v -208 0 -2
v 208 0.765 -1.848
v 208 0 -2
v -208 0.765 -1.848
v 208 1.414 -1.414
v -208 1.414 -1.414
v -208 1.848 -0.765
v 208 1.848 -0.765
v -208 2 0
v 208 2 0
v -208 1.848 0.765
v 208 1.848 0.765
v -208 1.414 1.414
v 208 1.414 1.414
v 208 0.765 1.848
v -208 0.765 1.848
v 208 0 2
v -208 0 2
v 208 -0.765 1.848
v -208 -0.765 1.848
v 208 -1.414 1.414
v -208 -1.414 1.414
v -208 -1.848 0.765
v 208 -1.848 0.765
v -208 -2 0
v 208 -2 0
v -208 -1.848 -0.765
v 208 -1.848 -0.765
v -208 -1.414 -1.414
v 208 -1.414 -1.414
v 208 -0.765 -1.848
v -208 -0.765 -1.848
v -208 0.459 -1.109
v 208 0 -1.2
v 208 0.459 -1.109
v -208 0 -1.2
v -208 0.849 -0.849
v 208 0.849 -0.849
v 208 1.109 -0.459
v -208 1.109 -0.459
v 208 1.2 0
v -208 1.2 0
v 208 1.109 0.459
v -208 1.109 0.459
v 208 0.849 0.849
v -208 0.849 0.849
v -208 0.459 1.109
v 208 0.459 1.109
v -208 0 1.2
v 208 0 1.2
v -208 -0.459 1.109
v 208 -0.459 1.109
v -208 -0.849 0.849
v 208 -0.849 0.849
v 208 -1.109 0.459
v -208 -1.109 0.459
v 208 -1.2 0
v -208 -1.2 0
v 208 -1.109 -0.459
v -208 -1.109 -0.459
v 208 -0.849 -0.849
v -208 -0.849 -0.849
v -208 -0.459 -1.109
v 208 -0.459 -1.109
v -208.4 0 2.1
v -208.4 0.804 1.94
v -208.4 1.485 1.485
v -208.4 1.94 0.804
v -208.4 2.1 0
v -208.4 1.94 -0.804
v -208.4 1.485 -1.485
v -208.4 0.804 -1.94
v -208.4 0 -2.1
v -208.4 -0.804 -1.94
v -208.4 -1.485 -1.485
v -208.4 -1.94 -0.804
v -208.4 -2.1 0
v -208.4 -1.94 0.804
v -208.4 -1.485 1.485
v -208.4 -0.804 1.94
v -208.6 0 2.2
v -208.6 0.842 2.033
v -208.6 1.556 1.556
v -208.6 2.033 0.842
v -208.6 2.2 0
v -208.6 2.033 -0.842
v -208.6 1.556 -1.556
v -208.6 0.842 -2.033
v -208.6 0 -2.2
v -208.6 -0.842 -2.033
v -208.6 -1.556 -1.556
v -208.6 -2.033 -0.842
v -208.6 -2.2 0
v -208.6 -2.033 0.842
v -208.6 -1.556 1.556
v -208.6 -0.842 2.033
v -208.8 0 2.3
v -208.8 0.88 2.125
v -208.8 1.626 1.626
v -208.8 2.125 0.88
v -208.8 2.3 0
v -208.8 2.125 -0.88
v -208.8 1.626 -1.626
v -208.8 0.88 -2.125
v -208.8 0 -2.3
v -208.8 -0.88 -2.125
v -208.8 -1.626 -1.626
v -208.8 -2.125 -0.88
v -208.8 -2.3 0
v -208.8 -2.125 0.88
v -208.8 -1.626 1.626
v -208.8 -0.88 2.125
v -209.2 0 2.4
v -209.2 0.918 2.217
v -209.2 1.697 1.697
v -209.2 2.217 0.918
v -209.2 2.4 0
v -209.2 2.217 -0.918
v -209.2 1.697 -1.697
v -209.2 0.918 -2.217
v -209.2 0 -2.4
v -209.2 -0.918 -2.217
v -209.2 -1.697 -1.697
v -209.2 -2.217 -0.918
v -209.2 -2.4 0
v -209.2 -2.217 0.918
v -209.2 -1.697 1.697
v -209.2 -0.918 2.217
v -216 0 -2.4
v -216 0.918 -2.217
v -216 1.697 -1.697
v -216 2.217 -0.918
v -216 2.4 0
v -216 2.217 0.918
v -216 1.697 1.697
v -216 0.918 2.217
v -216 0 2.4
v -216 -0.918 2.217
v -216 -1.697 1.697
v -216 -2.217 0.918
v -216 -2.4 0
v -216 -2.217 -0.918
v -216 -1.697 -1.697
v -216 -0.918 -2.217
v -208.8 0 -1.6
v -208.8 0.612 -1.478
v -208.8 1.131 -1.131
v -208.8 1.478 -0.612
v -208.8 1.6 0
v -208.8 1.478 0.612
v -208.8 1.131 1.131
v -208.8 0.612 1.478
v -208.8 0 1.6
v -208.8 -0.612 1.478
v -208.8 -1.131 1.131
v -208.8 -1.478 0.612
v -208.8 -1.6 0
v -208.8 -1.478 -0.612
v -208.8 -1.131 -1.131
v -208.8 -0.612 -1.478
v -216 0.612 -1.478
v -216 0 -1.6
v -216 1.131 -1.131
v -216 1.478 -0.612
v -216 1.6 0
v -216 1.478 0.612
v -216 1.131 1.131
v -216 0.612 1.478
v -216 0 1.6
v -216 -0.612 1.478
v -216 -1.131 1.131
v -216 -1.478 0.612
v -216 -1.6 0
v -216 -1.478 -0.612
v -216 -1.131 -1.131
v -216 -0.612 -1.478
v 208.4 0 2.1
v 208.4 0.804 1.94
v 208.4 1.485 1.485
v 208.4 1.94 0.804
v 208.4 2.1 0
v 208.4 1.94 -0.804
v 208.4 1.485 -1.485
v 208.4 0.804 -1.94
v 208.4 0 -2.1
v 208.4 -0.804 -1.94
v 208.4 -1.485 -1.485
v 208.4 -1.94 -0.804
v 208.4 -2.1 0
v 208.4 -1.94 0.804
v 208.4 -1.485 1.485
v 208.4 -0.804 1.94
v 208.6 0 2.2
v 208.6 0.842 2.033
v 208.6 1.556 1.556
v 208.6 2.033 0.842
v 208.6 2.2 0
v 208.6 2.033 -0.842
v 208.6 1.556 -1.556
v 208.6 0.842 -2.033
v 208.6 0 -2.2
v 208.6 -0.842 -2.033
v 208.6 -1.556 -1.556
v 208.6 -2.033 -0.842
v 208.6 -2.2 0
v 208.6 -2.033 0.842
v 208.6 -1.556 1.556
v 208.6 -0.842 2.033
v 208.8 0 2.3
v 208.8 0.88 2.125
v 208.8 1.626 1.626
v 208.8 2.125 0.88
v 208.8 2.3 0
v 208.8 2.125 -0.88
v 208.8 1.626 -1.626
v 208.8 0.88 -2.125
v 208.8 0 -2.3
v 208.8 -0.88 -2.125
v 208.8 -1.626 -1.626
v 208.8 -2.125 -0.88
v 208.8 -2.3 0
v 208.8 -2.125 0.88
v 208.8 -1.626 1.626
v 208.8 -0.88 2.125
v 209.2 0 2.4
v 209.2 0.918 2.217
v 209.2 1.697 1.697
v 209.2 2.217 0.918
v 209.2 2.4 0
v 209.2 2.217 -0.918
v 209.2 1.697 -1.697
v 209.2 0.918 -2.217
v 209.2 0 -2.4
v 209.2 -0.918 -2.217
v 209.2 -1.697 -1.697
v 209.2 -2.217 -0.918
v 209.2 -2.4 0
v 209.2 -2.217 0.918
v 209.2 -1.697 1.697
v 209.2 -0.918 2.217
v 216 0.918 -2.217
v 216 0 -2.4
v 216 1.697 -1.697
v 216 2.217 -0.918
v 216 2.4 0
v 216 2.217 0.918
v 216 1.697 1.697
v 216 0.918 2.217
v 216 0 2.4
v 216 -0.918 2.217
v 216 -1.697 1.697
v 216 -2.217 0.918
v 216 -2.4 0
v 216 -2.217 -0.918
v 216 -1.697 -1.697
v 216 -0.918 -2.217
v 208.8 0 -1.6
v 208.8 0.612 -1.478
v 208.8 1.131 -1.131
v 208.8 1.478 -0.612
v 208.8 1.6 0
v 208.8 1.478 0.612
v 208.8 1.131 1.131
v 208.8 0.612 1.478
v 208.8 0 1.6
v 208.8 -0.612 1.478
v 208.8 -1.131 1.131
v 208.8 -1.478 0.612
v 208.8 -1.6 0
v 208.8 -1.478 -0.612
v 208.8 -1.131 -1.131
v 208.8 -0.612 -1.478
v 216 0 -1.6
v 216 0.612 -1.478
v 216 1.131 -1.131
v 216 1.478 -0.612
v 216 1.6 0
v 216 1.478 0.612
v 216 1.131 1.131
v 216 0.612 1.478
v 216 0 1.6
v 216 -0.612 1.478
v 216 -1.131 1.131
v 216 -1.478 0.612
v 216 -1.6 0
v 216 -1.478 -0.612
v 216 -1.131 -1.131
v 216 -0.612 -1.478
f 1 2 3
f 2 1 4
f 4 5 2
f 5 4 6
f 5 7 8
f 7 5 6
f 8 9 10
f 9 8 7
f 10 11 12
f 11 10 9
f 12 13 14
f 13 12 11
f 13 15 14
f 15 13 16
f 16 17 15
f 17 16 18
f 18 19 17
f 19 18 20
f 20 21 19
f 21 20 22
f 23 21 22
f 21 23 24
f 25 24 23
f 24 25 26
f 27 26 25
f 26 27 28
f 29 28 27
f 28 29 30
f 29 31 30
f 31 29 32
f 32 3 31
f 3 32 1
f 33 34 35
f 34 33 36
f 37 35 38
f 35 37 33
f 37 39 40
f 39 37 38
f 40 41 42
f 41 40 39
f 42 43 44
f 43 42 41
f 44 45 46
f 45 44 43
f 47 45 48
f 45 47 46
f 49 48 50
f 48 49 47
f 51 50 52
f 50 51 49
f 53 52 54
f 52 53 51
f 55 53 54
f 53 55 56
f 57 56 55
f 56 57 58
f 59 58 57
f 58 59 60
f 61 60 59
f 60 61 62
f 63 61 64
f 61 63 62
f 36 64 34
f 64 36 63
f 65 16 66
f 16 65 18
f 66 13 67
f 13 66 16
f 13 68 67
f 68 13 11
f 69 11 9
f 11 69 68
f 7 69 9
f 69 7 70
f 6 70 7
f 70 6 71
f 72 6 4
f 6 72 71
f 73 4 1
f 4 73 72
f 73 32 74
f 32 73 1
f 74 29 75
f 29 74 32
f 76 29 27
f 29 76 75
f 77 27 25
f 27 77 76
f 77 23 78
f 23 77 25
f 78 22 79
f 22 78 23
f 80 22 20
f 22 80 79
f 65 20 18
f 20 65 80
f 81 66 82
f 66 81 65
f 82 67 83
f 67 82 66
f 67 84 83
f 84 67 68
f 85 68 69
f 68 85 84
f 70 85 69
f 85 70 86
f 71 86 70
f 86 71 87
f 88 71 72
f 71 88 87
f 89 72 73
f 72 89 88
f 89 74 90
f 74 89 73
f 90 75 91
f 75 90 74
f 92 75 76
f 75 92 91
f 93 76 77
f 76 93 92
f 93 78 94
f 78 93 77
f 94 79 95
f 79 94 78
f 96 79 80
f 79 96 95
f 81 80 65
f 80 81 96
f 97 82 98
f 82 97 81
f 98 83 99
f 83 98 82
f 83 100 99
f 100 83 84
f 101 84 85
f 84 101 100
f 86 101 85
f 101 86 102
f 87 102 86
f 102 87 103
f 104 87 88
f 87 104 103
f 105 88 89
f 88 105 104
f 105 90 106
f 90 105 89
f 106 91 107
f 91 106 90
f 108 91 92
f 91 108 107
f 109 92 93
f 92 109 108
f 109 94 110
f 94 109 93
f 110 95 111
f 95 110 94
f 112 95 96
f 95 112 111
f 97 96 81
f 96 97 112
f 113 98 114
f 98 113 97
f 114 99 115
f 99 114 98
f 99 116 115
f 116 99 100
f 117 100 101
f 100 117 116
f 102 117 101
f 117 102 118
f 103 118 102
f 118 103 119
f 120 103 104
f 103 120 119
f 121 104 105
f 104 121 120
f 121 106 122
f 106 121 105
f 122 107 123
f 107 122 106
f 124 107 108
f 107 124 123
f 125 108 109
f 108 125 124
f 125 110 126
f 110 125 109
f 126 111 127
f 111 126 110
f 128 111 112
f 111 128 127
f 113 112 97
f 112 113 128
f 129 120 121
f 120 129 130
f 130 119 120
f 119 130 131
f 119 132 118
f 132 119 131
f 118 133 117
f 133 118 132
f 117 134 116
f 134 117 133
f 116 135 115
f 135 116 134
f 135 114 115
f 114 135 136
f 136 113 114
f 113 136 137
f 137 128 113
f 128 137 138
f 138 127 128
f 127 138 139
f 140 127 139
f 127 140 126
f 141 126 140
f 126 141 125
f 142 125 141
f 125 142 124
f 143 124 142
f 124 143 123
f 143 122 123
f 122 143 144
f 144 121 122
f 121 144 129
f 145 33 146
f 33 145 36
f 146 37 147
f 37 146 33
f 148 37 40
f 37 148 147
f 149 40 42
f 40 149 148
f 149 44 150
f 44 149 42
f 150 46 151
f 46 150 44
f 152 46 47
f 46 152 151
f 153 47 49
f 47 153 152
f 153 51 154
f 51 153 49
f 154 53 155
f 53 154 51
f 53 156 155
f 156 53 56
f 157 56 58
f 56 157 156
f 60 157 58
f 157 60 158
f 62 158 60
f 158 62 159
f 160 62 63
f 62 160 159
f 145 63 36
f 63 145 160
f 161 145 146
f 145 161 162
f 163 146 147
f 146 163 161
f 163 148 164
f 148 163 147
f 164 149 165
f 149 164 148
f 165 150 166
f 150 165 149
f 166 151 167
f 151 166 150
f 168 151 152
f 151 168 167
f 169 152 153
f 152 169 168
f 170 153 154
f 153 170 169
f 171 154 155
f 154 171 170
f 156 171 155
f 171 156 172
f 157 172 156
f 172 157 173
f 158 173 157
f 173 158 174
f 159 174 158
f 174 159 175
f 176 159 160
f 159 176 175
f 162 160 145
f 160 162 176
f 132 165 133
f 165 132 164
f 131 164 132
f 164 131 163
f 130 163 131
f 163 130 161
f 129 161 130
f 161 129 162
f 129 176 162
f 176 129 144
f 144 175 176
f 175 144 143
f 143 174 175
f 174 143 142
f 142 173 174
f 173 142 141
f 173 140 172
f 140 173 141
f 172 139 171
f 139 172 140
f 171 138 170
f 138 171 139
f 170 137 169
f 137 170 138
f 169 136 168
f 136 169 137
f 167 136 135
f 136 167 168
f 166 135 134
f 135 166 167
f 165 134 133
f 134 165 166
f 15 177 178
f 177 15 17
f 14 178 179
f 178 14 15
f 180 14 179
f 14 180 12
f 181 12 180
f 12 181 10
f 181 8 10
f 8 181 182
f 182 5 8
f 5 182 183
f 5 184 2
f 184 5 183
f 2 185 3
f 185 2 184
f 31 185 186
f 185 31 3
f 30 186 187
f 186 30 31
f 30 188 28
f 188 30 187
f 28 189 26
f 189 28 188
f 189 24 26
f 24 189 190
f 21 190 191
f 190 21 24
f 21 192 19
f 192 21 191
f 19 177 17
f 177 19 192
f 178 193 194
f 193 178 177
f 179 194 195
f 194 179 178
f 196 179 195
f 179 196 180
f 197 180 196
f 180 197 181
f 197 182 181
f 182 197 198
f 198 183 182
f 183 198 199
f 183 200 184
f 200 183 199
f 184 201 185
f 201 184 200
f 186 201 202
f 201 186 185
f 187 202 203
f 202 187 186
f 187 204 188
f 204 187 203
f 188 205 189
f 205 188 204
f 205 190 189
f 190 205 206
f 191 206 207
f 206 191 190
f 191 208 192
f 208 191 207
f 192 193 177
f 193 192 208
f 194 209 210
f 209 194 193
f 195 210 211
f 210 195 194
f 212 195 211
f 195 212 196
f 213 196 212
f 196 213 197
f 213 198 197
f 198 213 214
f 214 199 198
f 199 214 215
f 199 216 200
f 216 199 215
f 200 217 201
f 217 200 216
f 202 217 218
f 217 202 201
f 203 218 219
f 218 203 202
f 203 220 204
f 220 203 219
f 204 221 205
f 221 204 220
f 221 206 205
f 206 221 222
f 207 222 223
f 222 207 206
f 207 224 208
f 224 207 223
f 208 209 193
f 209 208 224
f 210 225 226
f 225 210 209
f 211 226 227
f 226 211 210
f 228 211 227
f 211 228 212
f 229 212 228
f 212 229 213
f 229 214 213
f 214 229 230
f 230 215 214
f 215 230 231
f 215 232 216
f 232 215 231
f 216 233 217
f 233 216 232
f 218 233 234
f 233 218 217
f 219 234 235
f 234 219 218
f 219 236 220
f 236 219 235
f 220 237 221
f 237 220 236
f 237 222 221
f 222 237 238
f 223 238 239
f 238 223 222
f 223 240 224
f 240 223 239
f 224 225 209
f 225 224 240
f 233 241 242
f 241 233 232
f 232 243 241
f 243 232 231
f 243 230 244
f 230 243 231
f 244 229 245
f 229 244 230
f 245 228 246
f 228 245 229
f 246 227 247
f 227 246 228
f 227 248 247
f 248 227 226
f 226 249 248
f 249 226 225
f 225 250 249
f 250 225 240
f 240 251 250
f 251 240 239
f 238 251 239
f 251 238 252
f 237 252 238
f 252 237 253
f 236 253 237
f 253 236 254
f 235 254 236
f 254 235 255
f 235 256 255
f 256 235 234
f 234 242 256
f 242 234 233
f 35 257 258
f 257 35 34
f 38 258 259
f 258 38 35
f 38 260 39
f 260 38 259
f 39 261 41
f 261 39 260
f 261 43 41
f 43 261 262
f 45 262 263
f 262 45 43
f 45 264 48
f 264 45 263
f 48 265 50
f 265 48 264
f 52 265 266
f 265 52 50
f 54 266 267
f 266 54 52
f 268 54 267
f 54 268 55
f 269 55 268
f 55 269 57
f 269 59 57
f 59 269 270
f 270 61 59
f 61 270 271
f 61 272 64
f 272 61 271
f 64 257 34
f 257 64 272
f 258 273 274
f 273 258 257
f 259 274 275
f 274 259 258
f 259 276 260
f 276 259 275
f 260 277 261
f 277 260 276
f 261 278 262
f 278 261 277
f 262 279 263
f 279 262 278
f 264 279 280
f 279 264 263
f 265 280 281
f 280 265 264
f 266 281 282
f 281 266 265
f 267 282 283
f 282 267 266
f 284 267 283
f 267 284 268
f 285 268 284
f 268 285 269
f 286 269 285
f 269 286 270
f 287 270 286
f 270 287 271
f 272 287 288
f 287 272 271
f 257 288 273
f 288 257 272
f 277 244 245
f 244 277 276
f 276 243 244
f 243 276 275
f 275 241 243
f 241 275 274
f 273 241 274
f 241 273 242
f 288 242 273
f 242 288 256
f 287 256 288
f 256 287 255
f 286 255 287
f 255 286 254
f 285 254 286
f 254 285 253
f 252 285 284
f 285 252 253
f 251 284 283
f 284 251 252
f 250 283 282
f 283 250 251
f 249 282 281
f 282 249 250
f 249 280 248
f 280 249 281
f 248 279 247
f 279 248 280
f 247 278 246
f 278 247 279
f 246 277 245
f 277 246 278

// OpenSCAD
use <../lib.scad>
use <71533k01.scad>
use <71533k03.scad>
$fa=1; $fs=0.2;
function ldraw_lib__96890_f2(realsolid=false) = [
// 0 Technic Pneumatic Tube 54L with End Bulges
// 0 Name: 96890-f2.dat
// 0 Author: Philippe Hurbain [Philo]
// 0 !LDRAW_ORG Part UPDATE 2020-01
// 0 !LICENSE Licensed under CC BY 2.0 and CC BY 4.0 : see CAreadme.txt
// 
// 0 BFC CERTIFY CCW
  [0,"BFC","CERTIFY"],
  [0,"BFC","CCW"],
// 
// 0 !KEYWORDS 432 mm
// 
// 0 !HISTORY 2020-06-28 [PTadmin] Official Update 2020-01
// 
// 
// 1 16 -520 0 0 0 1040 0 1 0 0 0 0 1 71533k03.dat
  [1,16,-520,0,0,0,1040,0,1,0,0,0,0,1, ldraw_lib__71533k03(realsolid)],
// 1 16 -520 0 0 0 -1 0 1 0 0 0 0 1 71533k01.dat
  [1,16,-520,0,0,0,-1,0,1,0,0,0,0,1, ldraw_lib__71533k01(realsolid)],
// 1 16 520 0 0 0 1 0 1 0 0 0 0 1 71533k01.dat
  [1,16,520,0,0,0,1,0,1,0,0,0,0,1, ldraw_lib__71533k01(realsolid)],
];
module ldraw_lib__96890_f2(step=0, col=false, unit=2/5, alt=false, line=0.2, solid=!$preview)
    makepoly(ldraw_lib__96890_f2(solid), step=step, col=col, unit=unit, alt=alt, line=line, solid=solid);
ldraw_lib__96890_f2(line=0.2);
